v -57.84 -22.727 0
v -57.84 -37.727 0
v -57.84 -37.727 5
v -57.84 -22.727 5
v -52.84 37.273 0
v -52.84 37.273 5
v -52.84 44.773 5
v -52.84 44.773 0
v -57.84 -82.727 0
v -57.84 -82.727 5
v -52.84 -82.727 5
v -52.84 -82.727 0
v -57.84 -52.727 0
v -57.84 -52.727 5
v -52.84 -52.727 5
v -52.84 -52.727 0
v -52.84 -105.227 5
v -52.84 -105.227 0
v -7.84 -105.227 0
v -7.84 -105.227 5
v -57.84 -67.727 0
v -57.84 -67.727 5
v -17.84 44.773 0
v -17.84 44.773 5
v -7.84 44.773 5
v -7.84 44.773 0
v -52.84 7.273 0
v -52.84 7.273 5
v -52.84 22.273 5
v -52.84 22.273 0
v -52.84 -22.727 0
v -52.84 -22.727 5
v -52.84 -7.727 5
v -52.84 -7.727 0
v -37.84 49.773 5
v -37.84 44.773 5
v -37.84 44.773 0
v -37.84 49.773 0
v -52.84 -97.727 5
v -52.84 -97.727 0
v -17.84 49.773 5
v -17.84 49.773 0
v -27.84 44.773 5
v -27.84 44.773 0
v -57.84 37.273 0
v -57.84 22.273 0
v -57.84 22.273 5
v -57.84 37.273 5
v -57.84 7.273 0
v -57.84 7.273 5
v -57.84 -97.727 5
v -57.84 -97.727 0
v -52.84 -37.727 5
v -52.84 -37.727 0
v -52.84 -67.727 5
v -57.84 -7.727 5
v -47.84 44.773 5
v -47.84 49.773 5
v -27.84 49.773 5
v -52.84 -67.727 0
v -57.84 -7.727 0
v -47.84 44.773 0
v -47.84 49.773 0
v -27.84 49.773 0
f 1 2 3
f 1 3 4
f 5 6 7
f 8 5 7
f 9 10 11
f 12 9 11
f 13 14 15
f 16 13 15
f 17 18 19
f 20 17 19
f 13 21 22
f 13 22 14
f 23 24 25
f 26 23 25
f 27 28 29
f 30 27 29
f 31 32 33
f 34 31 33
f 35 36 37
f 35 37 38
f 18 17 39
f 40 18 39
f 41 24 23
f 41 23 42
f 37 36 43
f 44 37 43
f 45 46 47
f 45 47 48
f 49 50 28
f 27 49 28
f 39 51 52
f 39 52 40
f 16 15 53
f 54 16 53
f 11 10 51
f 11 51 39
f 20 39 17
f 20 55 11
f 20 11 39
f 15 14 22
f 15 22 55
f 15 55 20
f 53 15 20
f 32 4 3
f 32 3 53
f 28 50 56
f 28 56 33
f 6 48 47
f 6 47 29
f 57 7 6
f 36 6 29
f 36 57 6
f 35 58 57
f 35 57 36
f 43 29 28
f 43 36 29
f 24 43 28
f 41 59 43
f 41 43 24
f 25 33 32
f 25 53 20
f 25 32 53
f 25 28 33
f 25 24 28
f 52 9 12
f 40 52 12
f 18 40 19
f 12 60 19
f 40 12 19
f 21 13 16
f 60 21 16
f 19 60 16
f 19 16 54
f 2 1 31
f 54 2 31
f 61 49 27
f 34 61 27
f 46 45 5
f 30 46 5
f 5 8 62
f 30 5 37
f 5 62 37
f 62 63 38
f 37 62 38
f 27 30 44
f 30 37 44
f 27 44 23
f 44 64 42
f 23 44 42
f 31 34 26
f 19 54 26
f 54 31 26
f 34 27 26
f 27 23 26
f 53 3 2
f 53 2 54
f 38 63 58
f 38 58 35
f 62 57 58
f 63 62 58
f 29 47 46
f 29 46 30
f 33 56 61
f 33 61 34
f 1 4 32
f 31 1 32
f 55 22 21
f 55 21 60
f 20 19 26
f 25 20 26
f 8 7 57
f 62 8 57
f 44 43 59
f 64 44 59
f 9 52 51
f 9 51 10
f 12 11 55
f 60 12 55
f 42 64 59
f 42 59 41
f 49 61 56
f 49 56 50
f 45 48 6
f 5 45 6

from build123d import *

# Parameters (mm, degrees)
ESQUISSE1_W             = 50
ESQUISSE1_H             = 155
BOSS_EXTRU_1_DEPTH      = 5
ESQUISSE4_W             = 5
ESQUISSE4_H             = 15
ESQUISSE4_H_2           = 7.5
ESQUISSE4_W_2           = 10
ESQUISSE4_H_3           = 5
ENL_V_MAT_EXTRU_4_DEPTH = 5
ESQUISSE7_W             = 10
ESQUISSE7_H             = 5
ENL_V_MAT_EXTRU_5_DEPTH = 5
ESQUISSE8_W             = 5
ESQUISSE8_H             = 7.5
ENL_V_MAT_EXTRU_6_DEPTH = 5


with BuildPart() as part:
    # Esquisse1 → Boss.-Extru.1 (new body)
    with BuildSketch(Plane.XY):
        with Locations((-32.839977645, -27.727272727)):
            Rectangle(ESQUISSE1_W, ESQUISSE1_H)
    extrude(amount=BOSS_EXTRU_1_DEPTH)

    # Esquisse4 → Enlèv. mat.-Extru.4 (cut)
    with BuildSketch(Plane.XY.offset(5)):
        with Locations((-55.339977645, 14.772727273)):
            Rectangle(ESQUISSE4_W, ESQUISSE4_H)
        with Locations((-55.339977645, -15.227272727)):
            Rectangle(ESQUISSE4_W, ESQUISSE4_H)
        with Locations((-55.339977645, -45.227272727)):
            Rectangle(ESQUISSE4_W, ESQUISSE4_H)
        with Locations((-55.339977645, -75.227272727)):
            Rectangle(ESQUISSE4_W, ESQUISSE4_H)
        with Locations((-55.339977645, -101.477272727)):
            Rectangle(ESQUISSE4_W, ESQUISSE4_H_2)
        with Locations((-32.839977645, 47.272727273)):
            Rectangle(ESQUISSE4_W_2, ESQUISSE4_H_3)
        with Locations((-12.839977645, 47.272727273)):
            Rectangle(ESQUISSE4_W_2, ESQUISSE4_H_3)
    extrude(amount=-ENL_V_MAT_EXTRU_4_DEPTH, mode=Mode.SUBTRACT)

    # Esquisse7 → Enlèv. mat.-Extru.5 (cut)
    with BuildSketch(Plane.XY.offset(5)):
        with Locations((-52.839977645, 47.272727273)):
            Rectangle(ESQUISSE7_W, ESQUISSE7_H)
    extrude(amount=-ENL_V_MAT_EXTRU_5_DEPTH, mode=Mode.SUBTRACT)

    # Esquisse8 → Enlèv. mat.-Extru.6 (cut)
    with BuildSketch(Plane.XY.offset(5)):
        with Locations((-55.339977645, 41.022727273)):
            Rectangle(ESQUISSE8_W, ESQUISSE8_H)
    extrude(amount=-ENL_V_MAT_EXTRU_6_DEPTH, mode=Mode.SUBTRACT)


solid = part.part
